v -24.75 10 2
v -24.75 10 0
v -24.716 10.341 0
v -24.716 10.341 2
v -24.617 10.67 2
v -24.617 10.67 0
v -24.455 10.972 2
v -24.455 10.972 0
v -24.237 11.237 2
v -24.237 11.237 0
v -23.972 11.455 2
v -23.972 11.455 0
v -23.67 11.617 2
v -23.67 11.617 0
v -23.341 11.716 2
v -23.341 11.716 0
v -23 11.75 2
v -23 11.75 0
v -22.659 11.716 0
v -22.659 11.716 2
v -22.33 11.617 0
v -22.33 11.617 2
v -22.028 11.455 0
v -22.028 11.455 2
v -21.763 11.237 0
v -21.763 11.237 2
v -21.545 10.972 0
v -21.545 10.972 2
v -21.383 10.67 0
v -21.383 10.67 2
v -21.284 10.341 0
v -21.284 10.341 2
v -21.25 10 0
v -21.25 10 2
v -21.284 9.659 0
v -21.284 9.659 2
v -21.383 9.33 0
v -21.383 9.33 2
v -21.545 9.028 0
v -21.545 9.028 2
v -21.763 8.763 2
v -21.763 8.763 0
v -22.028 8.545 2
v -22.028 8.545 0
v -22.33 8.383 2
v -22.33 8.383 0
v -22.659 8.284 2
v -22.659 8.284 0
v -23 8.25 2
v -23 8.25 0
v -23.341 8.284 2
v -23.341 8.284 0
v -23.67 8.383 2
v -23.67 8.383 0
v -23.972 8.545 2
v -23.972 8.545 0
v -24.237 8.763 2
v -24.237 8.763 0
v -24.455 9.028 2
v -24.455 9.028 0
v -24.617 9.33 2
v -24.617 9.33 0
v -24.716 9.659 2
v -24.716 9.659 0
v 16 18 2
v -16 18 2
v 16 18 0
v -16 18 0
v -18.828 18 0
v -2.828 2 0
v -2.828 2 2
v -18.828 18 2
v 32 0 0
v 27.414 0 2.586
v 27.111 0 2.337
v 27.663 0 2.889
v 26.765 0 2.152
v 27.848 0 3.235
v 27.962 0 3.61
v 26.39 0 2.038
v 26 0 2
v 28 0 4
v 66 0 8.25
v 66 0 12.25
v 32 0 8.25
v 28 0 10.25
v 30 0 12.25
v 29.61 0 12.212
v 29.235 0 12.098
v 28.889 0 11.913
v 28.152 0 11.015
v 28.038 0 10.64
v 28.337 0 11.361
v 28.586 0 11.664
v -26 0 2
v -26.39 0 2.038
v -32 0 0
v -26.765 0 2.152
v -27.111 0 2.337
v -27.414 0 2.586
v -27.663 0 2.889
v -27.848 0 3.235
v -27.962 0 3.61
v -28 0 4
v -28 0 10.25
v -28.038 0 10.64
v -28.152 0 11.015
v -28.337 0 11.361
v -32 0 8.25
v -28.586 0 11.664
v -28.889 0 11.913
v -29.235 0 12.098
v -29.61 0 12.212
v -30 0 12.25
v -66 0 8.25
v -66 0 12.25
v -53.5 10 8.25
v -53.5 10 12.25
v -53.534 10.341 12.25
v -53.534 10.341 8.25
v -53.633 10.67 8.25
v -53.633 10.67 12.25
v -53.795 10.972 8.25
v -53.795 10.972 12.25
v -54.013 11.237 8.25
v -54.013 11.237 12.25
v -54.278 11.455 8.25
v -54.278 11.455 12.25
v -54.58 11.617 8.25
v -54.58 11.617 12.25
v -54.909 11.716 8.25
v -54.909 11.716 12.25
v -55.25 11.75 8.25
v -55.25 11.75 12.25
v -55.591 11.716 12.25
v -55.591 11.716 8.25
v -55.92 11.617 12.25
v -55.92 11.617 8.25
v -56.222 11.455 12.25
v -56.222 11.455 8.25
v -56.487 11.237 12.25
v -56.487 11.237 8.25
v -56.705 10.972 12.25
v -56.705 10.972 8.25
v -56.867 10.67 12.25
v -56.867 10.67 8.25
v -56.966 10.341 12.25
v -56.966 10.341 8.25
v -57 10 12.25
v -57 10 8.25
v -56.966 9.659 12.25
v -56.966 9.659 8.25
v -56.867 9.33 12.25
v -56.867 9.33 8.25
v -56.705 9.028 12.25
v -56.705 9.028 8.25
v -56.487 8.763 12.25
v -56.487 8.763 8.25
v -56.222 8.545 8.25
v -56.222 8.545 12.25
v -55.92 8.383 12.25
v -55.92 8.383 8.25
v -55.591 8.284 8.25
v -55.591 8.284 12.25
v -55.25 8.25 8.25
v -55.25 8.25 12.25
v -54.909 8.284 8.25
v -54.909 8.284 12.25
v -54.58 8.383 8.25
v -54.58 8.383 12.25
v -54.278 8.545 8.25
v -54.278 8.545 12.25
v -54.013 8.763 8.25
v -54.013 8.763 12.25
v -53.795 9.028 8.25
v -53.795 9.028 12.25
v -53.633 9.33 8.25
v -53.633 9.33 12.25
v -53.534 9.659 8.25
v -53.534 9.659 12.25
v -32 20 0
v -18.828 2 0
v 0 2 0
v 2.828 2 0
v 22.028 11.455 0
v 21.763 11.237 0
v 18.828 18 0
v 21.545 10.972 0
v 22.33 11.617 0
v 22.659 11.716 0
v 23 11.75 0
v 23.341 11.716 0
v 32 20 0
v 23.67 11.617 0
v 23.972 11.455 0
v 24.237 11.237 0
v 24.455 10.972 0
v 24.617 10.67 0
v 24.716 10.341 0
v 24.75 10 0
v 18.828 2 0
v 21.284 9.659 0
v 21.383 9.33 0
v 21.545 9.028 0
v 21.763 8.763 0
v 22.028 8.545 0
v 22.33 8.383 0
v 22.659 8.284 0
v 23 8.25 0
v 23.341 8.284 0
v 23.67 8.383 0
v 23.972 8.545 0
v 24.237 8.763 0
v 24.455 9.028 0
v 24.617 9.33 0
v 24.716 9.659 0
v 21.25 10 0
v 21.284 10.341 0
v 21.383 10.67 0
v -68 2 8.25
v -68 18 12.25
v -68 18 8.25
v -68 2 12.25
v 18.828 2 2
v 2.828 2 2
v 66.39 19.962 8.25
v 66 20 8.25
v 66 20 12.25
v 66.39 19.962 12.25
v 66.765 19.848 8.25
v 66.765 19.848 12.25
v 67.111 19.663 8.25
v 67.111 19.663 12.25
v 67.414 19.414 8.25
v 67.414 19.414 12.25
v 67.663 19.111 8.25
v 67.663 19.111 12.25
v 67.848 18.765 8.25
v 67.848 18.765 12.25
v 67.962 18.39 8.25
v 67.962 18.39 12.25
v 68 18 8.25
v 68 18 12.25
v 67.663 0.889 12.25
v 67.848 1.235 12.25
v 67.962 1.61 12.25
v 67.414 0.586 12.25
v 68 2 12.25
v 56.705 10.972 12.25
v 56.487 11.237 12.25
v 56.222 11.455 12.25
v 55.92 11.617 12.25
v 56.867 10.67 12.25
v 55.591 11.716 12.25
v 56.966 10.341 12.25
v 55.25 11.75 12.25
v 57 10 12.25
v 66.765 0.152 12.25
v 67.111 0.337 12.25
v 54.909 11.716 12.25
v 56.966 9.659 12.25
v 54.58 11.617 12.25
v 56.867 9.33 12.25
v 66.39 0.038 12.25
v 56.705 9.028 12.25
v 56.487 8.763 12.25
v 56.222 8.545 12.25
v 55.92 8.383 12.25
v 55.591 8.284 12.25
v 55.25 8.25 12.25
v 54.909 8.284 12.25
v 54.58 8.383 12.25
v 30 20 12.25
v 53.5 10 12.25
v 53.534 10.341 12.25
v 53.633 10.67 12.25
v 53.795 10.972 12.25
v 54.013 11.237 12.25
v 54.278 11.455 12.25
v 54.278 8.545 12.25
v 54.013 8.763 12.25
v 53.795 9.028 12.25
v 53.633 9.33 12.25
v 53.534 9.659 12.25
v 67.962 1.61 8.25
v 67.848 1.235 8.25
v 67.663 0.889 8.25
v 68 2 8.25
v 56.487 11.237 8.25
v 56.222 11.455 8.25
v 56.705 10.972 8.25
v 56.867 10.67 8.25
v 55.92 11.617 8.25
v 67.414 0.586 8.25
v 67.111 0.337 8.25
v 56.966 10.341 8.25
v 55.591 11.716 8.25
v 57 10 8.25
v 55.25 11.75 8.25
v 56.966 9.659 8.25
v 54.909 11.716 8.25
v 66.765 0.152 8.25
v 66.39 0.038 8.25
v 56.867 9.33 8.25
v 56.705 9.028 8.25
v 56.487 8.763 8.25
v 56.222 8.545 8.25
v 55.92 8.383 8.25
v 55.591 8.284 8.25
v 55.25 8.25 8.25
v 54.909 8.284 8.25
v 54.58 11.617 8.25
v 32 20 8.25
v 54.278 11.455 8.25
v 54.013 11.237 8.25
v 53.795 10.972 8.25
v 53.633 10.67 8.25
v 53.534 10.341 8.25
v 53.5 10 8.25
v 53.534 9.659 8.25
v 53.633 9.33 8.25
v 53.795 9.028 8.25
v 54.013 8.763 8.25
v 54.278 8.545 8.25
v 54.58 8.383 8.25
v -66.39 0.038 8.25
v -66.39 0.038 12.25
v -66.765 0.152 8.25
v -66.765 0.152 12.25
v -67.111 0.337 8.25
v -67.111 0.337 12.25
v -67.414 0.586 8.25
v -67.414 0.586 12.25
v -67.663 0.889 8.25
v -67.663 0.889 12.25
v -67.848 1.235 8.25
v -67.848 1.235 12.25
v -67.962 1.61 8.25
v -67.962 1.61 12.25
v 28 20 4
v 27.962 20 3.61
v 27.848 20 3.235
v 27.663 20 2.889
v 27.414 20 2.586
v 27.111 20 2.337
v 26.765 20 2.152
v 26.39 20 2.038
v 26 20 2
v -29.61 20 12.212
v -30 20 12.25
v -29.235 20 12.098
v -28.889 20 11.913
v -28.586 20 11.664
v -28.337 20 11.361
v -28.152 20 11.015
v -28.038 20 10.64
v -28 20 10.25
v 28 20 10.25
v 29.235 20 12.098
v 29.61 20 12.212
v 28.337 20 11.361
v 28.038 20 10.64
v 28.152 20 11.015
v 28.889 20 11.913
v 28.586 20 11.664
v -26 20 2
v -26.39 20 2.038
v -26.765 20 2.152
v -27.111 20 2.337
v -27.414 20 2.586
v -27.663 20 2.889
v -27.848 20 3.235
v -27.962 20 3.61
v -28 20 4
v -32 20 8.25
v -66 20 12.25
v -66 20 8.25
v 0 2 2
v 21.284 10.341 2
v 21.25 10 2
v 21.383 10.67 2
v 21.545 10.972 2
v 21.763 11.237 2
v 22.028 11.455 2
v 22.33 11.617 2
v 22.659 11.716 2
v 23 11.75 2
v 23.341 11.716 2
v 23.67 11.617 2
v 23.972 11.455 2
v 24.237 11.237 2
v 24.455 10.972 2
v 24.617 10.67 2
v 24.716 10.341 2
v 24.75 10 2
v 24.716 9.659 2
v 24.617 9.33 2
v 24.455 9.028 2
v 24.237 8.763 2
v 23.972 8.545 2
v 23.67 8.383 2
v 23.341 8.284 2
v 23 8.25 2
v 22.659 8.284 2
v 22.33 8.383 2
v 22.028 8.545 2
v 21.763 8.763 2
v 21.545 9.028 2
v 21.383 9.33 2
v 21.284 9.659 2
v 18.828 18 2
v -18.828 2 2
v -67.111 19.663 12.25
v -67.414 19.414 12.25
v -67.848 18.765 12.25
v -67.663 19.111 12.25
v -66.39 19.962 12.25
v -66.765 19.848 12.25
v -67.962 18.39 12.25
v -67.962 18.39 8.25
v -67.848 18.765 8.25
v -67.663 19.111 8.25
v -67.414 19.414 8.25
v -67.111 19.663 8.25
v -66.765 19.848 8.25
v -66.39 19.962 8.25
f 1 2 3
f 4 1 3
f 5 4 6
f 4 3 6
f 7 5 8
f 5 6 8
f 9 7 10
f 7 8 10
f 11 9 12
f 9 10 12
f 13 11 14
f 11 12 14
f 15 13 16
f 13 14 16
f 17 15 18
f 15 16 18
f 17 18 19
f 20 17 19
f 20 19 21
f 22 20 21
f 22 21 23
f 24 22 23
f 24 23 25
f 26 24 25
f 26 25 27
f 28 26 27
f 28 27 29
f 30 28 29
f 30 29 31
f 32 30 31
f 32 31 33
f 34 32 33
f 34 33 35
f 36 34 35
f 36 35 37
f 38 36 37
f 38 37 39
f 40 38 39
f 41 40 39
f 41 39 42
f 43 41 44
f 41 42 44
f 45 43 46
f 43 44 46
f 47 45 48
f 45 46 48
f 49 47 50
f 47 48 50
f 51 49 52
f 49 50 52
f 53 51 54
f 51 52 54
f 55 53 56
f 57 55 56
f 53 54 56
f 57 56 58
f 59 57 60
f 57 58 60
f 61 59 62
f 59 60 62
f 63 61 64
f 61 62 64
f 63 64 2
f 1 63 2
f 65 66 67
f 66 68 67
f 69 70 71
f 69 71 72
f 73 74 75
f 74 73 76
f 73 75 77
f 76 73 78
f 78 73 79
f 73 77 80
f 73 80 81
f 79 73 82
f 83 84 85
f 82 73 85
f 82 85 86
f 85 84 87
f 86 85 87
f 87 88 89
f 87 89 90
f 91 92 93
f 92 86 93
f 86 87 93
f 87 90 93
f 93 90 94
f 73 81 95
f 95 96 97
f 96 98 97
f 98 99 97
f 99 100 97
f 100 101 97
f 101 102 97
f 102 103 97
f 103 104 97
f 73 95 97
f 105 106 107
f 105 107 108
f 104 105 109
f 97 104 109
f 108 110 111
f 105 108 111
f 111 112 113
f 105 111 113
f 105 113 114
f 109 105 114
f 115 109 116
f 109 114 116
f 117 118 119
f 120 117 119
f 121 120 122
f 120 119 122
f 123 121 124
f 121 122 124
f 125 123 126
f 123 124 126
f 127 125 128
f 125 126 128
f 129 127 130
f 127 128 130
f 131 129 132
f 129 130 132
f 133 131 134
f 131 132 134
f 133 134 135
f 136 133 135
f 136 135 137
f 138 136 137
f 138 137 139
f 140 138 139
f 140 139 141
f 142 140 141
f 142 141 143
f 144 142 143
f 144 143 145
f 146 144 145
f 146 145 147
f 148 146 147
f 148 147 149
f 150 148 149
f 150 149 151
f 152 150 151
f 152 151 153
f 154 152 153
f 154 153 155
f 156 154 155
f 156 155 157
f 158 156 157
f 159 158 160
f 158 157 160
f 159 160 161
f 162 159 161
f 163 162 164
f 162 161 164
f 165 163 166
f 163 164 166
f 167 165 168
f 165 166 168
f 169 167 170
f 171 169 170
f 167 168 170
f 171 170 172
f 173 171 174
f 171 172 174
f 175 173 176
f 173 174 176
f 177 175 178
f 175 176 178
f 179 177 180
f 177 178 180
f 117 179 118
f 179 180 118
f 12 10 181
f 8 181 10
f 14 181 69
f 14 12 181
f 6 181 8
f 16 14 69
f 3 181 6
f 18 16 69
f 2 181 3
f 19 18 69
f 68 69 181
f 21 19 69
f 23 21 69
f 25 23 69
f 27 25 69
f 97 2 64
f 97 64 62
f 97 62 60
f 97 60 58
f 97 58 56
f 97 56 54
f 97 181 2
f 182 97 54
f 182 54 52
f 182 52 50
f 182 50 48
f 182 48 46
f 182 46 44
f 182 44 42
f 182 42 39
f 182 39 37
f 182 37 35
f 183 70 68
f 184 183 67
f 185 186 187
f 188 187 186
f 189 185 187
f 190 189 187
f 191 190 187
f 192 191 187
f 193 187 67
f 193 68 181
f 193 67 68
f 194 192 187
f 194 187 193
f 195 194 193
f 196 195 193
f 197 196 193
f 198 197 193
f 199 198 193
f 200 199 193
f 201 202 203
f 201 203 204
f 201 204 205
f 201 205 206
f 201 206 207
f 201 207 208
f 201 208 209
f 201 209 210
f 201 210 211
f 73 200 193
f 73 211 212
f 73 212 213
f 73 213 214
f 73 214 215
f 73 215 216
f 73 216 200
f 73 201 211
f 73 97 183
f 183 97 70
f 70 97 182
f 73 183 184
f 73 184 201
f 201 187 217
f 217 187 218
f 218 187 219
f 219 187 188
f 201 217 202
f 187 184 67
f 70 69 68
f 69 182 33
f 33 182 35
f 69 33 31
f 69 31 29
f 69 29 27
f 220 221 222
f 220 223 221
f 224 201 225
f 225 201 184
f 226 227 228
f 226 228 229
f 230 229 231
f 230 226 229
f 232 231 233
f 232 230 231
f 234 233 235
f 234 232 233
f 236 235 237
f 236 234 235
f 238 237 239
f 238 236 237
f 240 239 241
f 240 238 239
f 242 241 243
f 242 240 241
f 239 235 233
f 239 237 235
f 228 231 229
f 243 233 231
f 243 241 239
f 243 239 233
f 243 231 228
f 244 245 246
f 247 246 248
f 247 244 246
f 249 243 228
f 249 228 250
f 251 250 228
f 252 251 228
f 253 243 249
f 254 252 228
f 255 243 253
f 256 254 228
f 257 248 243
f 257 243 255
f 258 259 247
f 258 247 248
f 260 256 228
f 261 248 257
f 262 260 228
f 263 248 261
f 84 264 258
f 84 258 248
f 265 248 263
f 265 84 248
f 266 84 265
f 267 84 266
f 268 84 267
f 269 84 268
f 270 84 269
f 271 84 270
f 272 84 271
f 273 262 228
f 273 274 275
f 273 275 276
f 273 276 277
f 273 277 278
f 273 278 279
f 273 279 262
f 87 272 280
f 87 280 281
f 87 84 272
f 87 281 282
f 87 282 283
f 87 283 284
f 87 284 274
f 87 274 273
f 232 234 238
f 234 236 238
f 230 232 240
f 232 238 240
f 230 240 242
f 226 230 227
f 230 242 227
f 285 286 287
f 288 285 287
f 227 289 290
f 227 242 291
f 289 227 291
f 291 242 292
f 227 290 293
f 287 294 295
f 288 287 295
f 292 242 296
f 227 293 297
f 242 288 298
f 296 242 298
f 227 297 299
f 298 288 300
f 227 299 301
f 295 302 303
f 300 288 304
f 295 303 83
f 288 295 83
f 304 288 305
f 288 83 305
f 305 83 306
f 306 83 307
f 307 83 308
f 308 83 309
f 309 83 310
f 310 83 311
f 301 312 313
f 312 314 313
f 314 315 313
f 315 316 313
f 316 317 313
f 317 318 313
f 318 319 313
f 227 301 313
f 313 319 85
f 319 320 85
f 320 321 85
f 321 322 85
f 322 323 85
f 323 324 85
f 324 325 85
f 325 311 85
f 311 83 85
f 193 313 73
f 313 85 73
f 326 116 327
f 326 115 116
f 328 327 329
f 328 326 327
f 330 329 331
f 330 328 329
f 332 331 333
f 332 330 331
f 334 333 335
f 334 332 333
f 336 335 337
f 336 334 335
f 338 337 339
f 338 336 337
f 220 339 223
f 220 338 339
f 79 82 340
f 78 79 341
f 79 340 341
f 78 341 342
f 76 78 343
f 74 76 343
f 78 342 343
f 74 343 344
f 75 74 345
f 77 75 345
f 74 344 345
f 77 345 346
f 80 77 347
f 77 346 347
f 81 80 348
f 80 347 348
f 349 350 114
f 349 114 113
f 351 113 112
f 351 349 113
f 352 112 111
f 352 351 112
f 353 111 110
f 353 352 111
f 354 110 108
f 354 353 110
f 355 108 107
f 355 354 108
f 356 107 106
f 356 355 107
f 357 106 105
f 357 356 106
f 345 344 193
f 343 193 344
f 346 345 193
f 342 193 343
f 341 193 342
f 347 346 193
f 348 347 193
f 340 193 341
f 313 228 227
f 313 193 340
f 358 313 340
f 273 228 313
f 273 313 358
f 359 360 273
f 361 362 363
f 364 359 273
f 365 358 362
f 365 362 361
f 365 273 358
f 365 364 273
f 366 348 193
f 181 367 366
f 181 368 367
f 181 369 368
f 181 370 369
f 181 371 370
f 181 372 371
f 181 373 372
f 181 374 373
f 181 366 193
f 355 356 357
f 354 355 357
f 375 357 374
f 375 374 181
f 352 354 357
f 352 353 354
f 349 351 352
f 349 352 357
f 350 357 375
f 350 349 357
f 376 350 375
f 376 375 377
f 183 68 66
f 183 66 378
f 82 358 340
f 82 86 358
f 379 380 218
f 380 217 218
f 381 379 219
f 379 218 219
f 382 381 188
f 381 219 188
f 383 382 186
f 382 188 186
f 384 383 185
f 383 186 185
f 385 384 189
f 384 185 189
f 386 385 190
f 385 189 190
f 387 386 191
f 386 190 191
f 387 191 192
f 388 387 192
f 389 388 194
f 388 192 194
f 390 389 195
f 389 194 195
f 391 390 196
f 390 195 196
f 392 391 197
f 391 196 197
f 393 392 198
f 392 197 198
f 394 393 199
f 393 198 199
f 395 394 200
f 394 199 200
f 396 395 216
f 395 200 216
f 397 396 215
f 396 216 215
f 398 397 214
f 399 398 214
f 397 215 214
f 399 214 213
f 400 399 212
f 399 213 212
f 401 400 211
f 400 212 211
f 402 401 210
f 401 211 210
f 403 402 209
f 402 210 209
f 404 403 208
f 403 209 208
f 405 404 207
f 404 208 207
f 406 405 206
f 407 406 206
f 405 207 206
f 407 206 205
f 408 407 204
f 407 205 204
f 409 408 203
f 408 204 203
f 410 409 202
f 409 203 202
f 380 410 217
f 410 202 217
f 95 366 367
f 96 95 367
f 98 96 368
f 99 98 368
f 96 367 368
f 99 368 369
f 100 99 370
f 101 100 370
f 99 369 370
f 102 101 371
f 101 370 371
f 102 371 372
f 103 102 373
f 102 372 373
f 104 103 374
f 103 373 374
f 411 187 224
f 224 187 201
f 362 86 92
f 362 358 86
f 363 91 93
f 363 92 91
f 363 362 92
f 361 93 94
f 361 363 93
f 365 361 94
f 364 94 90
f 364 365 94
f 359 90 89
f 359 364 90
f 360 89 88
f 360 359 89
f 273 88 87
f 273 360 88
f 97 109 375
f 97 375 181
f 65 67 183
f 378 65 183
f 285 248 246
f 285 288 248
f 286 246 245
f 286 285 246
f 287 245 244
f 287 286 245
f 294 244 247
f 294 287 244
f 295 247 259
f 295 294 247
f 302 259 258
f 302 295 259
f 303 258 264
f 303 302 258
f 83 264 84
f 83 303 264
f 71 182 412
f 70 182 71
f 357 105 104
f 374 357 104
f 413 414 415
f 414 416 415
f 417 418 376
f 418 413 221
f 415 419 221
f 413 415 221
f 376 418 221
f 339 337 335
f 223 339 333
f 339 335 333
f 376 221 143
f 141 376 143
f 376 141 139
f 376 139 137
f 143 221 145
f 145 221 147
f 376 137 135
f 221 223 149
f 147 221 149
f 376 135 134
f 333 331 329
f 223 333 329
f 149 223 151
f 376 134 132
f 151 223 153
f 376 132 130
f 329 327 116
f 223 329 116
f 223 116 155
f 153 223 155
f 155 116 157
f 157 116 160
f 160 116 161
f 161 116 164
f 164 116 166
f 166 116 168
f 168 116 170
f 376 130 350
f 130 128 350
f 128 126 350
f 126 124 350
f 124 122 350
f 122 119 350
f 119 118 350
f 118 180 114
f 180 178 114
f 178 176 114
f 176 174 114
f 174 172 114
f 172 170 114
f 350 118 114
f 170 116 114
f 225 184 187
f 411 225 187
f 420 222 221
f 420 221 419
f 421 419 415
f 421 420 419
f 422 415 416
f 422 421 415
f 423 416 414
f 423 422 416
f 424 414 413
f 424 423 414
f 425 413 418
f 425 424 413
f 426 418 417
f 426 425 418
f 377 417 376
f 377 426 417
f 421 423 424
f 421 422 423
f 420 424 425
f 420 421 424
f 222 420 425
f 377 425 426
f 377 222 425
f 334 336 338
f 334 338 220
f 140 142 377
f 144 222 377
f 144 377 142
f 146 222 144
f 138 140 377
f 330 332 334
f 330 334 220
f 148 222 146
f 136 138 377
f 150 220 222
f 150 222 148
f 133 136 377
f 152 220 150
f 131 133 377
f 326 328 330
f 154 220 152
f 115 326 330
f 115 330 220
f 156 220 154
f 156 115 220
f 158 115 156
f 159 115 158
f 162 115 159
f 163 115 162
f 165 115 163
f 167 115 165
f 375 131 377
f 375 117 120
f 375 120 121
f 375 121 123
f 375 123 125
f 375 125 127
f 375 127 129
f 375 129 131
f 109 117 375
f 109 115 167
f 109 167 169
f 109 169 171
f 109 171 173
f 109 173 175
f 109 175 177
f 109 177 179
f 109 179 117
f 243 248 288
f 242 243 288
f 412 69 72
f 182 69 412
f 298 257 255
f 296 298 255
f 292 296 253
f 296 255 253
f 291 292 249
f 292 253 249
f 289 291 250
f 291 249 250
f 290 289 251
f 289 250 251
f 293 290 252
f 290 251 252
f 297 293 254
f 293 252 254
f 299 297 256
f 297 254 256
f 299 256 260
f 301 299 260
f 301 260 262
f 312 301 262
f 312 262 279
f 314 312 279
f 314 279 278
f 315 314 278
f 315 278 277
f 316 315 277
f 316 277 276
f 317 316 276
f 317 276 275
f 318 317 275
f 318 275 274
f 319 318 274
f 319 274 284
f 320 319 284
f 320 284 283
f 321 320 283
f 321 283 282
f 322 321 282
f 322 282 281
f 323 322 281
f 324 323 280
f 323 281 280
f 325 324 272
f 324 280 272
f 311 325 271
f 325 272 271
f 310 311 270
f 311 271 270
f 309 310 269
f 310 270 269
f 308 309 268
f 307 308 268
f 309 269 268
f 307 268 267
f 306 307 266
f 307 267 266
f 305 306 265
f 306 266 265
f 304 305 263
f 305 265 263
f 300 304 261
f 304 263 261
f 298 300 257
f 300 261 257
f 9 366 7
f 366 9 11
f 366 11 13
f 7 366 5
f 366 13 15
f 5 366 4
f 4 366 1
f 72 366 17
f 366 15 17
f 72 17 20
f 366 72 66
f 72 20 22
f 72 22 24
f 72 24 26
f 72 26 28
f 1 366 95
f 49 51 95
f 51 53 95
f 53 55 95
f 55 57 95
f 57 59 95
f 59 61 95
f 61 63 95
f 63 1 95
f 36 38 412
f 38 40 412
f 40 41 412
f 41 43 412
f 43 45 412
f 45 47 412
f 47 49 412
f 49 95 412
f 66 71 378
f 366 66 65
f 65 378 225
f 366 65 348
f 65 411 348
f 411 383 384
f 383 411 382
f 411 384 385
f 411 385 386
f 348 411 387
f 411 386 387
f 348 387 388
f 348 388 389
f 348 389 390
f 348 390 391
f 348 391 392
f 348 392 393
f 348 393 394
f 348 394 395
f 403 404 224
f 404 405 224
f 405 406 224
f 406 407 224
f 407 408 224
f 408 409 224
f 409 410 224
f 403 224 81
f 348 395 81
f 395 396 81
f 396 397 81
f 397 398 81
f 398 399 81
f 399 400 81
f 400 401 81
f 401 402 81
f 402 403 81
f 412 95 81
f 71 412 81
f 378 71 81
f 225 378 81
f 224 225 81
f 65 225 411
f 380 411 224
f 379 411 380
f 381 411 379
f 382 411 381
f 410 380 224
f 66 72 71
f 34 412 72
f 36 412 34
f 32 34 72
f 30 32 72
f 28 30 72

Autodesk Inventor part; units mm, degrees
ref_plane "YZ Plane" through (0, 0, 0) normal (1, 0, 0) x (0, 1, 0)
ref_plane "XZ Plane" through (0, 0, 0) normal (0, 1, 0) x (-1, 0, 0)
ref_plane "XY Plane" through (0, 0, 0) normal (0, 0, 1) x (1, 0, 0)
sketch "スケッチ1" plane through (0, 0, 0) normal (0, 1, 0) x (-1, 0, 0)
  line L0 (0, 20.7547) -> (0, -42.4528)
  line L1 (68, 12.25) -> (28, 12.25)
  line L2 (28, 12.25) -> (28, 2)
  line L3 (28, 2) -> (0, 2)
  line L4 (68, 12.25) -> (68, 8.25)
  line L5 (68, 8.25) -> (32, 8.25)
  line L6 (32, 8.25) -> (32, 0)
  line L7 (32, 0) -> (0, 0)
  line L8 (-68, 12.25) -> (-28, 12.25)
  line L9 (-28, 12.25) -> (-28, 2)
  line L10 (-28, 2) -> (0, 2)
  line L11 (-68, 12.25) -> (-68, 8.25)
  line L12 (-68, 8.25) -> (-32, 8.25)
  line L13 (-32, 8.25) -> (-32, 0)
  line L14 (-32, 0) -> (0, 0)
  dimension "d0" = 40
  dimension "d1" = 4
  dimension "d2" = 36
  dimension "d3" = 10.25
  dimension "d4" = 2
  dimension "d5" = 56
extrude "押し出し1" add sketch "スケッチ1" along normal blind 20
sketch "スケッチ2" plane through (32, 0, 0) normal (0, 0, -1) x (-1, 0, 0)
  line L0 (0, 0) -> (0, 20) projected
  line L1 (0, 10) -> (64, 10)
  line L2 (64, 0) -> (64, 20) projected
  line L3 (32, 0) -> (32, 20)
  line L4 (0, 20) -> (64, 20) projected
  circle A0 centre (9, 10) radius 1.75
  line L5 (13.1716, 18) -> (13.1716, 2)
  line L6 (13.1716, 2) -> (29.1716, 2)
  line L7 (29.1716, 2) -> (13.1716, 18)
  line L8 (16, 18) -> (32, 18)
  line L9 (16, 18) -> (32, 2)
  circle A1 centre (55, 10) radius 1.75
  line L10 (50.8284, 18) -> (50.8284, 2)
  line L11 (50.8284, 2) -> (34.8284, 2)
  line L12 (34.8284, 2) -> (50.8284, 18)
  line L13 (48, 18) -> (32, 18)
  line L14 (48, 18) -> (32, 2)
  dimension "d8" = 16
  dimension "d9" = 3.5
  dimension "d10" = 2
  dimension "d11" = 46
extrude "押し出し2" cut sketch "スケッチ2" against normal through all contours A0 L1 | L1 A0 | L13 L14 L1 L3 | L3 L1 L9 L8 | L5 L7 L1 | L1 L7 L6 L5 | L3 L9 L1 | L1 L14 L3 | A1 L1 | L1 A1 | L12 L10 L1 | L1 L10 L11 L12
sketch "スケッチ3" plane through (28, 0, 12.25) normal (0, 0, 1) x (1, 0, 0)
  line L0 (-96, 0) -> (-96, 20) projected
  line L1 (-96, 10) -> (40, 10)
  line L2 (40, 0) -> (40, 20) projected
  circle A0 centre (27.25, 10) radius 1.75
  circle A1 centre (-83.25, 10) radius 1.75
  point P0 (-28, 0)
  dimension "d14" = 3.5
  dimension "d15" = 12.75
  dimension "d16" = 12.75
extrude "押し出し3" cut sketch "スケッチ3" against normal through all
fillet "フィレット1" radius 2 4 edges at (-68, 20, 10.25) (68, 20, 10.25) (68, 0, 10.25) (-68, 0, 10.25)
fillet "フィレット2" radius 2 4 edges at (-28, 10, 2) (-28, 10, 12.25) (28, 10, 2) (28, 10, 12.25)
properties part number "axis3"
